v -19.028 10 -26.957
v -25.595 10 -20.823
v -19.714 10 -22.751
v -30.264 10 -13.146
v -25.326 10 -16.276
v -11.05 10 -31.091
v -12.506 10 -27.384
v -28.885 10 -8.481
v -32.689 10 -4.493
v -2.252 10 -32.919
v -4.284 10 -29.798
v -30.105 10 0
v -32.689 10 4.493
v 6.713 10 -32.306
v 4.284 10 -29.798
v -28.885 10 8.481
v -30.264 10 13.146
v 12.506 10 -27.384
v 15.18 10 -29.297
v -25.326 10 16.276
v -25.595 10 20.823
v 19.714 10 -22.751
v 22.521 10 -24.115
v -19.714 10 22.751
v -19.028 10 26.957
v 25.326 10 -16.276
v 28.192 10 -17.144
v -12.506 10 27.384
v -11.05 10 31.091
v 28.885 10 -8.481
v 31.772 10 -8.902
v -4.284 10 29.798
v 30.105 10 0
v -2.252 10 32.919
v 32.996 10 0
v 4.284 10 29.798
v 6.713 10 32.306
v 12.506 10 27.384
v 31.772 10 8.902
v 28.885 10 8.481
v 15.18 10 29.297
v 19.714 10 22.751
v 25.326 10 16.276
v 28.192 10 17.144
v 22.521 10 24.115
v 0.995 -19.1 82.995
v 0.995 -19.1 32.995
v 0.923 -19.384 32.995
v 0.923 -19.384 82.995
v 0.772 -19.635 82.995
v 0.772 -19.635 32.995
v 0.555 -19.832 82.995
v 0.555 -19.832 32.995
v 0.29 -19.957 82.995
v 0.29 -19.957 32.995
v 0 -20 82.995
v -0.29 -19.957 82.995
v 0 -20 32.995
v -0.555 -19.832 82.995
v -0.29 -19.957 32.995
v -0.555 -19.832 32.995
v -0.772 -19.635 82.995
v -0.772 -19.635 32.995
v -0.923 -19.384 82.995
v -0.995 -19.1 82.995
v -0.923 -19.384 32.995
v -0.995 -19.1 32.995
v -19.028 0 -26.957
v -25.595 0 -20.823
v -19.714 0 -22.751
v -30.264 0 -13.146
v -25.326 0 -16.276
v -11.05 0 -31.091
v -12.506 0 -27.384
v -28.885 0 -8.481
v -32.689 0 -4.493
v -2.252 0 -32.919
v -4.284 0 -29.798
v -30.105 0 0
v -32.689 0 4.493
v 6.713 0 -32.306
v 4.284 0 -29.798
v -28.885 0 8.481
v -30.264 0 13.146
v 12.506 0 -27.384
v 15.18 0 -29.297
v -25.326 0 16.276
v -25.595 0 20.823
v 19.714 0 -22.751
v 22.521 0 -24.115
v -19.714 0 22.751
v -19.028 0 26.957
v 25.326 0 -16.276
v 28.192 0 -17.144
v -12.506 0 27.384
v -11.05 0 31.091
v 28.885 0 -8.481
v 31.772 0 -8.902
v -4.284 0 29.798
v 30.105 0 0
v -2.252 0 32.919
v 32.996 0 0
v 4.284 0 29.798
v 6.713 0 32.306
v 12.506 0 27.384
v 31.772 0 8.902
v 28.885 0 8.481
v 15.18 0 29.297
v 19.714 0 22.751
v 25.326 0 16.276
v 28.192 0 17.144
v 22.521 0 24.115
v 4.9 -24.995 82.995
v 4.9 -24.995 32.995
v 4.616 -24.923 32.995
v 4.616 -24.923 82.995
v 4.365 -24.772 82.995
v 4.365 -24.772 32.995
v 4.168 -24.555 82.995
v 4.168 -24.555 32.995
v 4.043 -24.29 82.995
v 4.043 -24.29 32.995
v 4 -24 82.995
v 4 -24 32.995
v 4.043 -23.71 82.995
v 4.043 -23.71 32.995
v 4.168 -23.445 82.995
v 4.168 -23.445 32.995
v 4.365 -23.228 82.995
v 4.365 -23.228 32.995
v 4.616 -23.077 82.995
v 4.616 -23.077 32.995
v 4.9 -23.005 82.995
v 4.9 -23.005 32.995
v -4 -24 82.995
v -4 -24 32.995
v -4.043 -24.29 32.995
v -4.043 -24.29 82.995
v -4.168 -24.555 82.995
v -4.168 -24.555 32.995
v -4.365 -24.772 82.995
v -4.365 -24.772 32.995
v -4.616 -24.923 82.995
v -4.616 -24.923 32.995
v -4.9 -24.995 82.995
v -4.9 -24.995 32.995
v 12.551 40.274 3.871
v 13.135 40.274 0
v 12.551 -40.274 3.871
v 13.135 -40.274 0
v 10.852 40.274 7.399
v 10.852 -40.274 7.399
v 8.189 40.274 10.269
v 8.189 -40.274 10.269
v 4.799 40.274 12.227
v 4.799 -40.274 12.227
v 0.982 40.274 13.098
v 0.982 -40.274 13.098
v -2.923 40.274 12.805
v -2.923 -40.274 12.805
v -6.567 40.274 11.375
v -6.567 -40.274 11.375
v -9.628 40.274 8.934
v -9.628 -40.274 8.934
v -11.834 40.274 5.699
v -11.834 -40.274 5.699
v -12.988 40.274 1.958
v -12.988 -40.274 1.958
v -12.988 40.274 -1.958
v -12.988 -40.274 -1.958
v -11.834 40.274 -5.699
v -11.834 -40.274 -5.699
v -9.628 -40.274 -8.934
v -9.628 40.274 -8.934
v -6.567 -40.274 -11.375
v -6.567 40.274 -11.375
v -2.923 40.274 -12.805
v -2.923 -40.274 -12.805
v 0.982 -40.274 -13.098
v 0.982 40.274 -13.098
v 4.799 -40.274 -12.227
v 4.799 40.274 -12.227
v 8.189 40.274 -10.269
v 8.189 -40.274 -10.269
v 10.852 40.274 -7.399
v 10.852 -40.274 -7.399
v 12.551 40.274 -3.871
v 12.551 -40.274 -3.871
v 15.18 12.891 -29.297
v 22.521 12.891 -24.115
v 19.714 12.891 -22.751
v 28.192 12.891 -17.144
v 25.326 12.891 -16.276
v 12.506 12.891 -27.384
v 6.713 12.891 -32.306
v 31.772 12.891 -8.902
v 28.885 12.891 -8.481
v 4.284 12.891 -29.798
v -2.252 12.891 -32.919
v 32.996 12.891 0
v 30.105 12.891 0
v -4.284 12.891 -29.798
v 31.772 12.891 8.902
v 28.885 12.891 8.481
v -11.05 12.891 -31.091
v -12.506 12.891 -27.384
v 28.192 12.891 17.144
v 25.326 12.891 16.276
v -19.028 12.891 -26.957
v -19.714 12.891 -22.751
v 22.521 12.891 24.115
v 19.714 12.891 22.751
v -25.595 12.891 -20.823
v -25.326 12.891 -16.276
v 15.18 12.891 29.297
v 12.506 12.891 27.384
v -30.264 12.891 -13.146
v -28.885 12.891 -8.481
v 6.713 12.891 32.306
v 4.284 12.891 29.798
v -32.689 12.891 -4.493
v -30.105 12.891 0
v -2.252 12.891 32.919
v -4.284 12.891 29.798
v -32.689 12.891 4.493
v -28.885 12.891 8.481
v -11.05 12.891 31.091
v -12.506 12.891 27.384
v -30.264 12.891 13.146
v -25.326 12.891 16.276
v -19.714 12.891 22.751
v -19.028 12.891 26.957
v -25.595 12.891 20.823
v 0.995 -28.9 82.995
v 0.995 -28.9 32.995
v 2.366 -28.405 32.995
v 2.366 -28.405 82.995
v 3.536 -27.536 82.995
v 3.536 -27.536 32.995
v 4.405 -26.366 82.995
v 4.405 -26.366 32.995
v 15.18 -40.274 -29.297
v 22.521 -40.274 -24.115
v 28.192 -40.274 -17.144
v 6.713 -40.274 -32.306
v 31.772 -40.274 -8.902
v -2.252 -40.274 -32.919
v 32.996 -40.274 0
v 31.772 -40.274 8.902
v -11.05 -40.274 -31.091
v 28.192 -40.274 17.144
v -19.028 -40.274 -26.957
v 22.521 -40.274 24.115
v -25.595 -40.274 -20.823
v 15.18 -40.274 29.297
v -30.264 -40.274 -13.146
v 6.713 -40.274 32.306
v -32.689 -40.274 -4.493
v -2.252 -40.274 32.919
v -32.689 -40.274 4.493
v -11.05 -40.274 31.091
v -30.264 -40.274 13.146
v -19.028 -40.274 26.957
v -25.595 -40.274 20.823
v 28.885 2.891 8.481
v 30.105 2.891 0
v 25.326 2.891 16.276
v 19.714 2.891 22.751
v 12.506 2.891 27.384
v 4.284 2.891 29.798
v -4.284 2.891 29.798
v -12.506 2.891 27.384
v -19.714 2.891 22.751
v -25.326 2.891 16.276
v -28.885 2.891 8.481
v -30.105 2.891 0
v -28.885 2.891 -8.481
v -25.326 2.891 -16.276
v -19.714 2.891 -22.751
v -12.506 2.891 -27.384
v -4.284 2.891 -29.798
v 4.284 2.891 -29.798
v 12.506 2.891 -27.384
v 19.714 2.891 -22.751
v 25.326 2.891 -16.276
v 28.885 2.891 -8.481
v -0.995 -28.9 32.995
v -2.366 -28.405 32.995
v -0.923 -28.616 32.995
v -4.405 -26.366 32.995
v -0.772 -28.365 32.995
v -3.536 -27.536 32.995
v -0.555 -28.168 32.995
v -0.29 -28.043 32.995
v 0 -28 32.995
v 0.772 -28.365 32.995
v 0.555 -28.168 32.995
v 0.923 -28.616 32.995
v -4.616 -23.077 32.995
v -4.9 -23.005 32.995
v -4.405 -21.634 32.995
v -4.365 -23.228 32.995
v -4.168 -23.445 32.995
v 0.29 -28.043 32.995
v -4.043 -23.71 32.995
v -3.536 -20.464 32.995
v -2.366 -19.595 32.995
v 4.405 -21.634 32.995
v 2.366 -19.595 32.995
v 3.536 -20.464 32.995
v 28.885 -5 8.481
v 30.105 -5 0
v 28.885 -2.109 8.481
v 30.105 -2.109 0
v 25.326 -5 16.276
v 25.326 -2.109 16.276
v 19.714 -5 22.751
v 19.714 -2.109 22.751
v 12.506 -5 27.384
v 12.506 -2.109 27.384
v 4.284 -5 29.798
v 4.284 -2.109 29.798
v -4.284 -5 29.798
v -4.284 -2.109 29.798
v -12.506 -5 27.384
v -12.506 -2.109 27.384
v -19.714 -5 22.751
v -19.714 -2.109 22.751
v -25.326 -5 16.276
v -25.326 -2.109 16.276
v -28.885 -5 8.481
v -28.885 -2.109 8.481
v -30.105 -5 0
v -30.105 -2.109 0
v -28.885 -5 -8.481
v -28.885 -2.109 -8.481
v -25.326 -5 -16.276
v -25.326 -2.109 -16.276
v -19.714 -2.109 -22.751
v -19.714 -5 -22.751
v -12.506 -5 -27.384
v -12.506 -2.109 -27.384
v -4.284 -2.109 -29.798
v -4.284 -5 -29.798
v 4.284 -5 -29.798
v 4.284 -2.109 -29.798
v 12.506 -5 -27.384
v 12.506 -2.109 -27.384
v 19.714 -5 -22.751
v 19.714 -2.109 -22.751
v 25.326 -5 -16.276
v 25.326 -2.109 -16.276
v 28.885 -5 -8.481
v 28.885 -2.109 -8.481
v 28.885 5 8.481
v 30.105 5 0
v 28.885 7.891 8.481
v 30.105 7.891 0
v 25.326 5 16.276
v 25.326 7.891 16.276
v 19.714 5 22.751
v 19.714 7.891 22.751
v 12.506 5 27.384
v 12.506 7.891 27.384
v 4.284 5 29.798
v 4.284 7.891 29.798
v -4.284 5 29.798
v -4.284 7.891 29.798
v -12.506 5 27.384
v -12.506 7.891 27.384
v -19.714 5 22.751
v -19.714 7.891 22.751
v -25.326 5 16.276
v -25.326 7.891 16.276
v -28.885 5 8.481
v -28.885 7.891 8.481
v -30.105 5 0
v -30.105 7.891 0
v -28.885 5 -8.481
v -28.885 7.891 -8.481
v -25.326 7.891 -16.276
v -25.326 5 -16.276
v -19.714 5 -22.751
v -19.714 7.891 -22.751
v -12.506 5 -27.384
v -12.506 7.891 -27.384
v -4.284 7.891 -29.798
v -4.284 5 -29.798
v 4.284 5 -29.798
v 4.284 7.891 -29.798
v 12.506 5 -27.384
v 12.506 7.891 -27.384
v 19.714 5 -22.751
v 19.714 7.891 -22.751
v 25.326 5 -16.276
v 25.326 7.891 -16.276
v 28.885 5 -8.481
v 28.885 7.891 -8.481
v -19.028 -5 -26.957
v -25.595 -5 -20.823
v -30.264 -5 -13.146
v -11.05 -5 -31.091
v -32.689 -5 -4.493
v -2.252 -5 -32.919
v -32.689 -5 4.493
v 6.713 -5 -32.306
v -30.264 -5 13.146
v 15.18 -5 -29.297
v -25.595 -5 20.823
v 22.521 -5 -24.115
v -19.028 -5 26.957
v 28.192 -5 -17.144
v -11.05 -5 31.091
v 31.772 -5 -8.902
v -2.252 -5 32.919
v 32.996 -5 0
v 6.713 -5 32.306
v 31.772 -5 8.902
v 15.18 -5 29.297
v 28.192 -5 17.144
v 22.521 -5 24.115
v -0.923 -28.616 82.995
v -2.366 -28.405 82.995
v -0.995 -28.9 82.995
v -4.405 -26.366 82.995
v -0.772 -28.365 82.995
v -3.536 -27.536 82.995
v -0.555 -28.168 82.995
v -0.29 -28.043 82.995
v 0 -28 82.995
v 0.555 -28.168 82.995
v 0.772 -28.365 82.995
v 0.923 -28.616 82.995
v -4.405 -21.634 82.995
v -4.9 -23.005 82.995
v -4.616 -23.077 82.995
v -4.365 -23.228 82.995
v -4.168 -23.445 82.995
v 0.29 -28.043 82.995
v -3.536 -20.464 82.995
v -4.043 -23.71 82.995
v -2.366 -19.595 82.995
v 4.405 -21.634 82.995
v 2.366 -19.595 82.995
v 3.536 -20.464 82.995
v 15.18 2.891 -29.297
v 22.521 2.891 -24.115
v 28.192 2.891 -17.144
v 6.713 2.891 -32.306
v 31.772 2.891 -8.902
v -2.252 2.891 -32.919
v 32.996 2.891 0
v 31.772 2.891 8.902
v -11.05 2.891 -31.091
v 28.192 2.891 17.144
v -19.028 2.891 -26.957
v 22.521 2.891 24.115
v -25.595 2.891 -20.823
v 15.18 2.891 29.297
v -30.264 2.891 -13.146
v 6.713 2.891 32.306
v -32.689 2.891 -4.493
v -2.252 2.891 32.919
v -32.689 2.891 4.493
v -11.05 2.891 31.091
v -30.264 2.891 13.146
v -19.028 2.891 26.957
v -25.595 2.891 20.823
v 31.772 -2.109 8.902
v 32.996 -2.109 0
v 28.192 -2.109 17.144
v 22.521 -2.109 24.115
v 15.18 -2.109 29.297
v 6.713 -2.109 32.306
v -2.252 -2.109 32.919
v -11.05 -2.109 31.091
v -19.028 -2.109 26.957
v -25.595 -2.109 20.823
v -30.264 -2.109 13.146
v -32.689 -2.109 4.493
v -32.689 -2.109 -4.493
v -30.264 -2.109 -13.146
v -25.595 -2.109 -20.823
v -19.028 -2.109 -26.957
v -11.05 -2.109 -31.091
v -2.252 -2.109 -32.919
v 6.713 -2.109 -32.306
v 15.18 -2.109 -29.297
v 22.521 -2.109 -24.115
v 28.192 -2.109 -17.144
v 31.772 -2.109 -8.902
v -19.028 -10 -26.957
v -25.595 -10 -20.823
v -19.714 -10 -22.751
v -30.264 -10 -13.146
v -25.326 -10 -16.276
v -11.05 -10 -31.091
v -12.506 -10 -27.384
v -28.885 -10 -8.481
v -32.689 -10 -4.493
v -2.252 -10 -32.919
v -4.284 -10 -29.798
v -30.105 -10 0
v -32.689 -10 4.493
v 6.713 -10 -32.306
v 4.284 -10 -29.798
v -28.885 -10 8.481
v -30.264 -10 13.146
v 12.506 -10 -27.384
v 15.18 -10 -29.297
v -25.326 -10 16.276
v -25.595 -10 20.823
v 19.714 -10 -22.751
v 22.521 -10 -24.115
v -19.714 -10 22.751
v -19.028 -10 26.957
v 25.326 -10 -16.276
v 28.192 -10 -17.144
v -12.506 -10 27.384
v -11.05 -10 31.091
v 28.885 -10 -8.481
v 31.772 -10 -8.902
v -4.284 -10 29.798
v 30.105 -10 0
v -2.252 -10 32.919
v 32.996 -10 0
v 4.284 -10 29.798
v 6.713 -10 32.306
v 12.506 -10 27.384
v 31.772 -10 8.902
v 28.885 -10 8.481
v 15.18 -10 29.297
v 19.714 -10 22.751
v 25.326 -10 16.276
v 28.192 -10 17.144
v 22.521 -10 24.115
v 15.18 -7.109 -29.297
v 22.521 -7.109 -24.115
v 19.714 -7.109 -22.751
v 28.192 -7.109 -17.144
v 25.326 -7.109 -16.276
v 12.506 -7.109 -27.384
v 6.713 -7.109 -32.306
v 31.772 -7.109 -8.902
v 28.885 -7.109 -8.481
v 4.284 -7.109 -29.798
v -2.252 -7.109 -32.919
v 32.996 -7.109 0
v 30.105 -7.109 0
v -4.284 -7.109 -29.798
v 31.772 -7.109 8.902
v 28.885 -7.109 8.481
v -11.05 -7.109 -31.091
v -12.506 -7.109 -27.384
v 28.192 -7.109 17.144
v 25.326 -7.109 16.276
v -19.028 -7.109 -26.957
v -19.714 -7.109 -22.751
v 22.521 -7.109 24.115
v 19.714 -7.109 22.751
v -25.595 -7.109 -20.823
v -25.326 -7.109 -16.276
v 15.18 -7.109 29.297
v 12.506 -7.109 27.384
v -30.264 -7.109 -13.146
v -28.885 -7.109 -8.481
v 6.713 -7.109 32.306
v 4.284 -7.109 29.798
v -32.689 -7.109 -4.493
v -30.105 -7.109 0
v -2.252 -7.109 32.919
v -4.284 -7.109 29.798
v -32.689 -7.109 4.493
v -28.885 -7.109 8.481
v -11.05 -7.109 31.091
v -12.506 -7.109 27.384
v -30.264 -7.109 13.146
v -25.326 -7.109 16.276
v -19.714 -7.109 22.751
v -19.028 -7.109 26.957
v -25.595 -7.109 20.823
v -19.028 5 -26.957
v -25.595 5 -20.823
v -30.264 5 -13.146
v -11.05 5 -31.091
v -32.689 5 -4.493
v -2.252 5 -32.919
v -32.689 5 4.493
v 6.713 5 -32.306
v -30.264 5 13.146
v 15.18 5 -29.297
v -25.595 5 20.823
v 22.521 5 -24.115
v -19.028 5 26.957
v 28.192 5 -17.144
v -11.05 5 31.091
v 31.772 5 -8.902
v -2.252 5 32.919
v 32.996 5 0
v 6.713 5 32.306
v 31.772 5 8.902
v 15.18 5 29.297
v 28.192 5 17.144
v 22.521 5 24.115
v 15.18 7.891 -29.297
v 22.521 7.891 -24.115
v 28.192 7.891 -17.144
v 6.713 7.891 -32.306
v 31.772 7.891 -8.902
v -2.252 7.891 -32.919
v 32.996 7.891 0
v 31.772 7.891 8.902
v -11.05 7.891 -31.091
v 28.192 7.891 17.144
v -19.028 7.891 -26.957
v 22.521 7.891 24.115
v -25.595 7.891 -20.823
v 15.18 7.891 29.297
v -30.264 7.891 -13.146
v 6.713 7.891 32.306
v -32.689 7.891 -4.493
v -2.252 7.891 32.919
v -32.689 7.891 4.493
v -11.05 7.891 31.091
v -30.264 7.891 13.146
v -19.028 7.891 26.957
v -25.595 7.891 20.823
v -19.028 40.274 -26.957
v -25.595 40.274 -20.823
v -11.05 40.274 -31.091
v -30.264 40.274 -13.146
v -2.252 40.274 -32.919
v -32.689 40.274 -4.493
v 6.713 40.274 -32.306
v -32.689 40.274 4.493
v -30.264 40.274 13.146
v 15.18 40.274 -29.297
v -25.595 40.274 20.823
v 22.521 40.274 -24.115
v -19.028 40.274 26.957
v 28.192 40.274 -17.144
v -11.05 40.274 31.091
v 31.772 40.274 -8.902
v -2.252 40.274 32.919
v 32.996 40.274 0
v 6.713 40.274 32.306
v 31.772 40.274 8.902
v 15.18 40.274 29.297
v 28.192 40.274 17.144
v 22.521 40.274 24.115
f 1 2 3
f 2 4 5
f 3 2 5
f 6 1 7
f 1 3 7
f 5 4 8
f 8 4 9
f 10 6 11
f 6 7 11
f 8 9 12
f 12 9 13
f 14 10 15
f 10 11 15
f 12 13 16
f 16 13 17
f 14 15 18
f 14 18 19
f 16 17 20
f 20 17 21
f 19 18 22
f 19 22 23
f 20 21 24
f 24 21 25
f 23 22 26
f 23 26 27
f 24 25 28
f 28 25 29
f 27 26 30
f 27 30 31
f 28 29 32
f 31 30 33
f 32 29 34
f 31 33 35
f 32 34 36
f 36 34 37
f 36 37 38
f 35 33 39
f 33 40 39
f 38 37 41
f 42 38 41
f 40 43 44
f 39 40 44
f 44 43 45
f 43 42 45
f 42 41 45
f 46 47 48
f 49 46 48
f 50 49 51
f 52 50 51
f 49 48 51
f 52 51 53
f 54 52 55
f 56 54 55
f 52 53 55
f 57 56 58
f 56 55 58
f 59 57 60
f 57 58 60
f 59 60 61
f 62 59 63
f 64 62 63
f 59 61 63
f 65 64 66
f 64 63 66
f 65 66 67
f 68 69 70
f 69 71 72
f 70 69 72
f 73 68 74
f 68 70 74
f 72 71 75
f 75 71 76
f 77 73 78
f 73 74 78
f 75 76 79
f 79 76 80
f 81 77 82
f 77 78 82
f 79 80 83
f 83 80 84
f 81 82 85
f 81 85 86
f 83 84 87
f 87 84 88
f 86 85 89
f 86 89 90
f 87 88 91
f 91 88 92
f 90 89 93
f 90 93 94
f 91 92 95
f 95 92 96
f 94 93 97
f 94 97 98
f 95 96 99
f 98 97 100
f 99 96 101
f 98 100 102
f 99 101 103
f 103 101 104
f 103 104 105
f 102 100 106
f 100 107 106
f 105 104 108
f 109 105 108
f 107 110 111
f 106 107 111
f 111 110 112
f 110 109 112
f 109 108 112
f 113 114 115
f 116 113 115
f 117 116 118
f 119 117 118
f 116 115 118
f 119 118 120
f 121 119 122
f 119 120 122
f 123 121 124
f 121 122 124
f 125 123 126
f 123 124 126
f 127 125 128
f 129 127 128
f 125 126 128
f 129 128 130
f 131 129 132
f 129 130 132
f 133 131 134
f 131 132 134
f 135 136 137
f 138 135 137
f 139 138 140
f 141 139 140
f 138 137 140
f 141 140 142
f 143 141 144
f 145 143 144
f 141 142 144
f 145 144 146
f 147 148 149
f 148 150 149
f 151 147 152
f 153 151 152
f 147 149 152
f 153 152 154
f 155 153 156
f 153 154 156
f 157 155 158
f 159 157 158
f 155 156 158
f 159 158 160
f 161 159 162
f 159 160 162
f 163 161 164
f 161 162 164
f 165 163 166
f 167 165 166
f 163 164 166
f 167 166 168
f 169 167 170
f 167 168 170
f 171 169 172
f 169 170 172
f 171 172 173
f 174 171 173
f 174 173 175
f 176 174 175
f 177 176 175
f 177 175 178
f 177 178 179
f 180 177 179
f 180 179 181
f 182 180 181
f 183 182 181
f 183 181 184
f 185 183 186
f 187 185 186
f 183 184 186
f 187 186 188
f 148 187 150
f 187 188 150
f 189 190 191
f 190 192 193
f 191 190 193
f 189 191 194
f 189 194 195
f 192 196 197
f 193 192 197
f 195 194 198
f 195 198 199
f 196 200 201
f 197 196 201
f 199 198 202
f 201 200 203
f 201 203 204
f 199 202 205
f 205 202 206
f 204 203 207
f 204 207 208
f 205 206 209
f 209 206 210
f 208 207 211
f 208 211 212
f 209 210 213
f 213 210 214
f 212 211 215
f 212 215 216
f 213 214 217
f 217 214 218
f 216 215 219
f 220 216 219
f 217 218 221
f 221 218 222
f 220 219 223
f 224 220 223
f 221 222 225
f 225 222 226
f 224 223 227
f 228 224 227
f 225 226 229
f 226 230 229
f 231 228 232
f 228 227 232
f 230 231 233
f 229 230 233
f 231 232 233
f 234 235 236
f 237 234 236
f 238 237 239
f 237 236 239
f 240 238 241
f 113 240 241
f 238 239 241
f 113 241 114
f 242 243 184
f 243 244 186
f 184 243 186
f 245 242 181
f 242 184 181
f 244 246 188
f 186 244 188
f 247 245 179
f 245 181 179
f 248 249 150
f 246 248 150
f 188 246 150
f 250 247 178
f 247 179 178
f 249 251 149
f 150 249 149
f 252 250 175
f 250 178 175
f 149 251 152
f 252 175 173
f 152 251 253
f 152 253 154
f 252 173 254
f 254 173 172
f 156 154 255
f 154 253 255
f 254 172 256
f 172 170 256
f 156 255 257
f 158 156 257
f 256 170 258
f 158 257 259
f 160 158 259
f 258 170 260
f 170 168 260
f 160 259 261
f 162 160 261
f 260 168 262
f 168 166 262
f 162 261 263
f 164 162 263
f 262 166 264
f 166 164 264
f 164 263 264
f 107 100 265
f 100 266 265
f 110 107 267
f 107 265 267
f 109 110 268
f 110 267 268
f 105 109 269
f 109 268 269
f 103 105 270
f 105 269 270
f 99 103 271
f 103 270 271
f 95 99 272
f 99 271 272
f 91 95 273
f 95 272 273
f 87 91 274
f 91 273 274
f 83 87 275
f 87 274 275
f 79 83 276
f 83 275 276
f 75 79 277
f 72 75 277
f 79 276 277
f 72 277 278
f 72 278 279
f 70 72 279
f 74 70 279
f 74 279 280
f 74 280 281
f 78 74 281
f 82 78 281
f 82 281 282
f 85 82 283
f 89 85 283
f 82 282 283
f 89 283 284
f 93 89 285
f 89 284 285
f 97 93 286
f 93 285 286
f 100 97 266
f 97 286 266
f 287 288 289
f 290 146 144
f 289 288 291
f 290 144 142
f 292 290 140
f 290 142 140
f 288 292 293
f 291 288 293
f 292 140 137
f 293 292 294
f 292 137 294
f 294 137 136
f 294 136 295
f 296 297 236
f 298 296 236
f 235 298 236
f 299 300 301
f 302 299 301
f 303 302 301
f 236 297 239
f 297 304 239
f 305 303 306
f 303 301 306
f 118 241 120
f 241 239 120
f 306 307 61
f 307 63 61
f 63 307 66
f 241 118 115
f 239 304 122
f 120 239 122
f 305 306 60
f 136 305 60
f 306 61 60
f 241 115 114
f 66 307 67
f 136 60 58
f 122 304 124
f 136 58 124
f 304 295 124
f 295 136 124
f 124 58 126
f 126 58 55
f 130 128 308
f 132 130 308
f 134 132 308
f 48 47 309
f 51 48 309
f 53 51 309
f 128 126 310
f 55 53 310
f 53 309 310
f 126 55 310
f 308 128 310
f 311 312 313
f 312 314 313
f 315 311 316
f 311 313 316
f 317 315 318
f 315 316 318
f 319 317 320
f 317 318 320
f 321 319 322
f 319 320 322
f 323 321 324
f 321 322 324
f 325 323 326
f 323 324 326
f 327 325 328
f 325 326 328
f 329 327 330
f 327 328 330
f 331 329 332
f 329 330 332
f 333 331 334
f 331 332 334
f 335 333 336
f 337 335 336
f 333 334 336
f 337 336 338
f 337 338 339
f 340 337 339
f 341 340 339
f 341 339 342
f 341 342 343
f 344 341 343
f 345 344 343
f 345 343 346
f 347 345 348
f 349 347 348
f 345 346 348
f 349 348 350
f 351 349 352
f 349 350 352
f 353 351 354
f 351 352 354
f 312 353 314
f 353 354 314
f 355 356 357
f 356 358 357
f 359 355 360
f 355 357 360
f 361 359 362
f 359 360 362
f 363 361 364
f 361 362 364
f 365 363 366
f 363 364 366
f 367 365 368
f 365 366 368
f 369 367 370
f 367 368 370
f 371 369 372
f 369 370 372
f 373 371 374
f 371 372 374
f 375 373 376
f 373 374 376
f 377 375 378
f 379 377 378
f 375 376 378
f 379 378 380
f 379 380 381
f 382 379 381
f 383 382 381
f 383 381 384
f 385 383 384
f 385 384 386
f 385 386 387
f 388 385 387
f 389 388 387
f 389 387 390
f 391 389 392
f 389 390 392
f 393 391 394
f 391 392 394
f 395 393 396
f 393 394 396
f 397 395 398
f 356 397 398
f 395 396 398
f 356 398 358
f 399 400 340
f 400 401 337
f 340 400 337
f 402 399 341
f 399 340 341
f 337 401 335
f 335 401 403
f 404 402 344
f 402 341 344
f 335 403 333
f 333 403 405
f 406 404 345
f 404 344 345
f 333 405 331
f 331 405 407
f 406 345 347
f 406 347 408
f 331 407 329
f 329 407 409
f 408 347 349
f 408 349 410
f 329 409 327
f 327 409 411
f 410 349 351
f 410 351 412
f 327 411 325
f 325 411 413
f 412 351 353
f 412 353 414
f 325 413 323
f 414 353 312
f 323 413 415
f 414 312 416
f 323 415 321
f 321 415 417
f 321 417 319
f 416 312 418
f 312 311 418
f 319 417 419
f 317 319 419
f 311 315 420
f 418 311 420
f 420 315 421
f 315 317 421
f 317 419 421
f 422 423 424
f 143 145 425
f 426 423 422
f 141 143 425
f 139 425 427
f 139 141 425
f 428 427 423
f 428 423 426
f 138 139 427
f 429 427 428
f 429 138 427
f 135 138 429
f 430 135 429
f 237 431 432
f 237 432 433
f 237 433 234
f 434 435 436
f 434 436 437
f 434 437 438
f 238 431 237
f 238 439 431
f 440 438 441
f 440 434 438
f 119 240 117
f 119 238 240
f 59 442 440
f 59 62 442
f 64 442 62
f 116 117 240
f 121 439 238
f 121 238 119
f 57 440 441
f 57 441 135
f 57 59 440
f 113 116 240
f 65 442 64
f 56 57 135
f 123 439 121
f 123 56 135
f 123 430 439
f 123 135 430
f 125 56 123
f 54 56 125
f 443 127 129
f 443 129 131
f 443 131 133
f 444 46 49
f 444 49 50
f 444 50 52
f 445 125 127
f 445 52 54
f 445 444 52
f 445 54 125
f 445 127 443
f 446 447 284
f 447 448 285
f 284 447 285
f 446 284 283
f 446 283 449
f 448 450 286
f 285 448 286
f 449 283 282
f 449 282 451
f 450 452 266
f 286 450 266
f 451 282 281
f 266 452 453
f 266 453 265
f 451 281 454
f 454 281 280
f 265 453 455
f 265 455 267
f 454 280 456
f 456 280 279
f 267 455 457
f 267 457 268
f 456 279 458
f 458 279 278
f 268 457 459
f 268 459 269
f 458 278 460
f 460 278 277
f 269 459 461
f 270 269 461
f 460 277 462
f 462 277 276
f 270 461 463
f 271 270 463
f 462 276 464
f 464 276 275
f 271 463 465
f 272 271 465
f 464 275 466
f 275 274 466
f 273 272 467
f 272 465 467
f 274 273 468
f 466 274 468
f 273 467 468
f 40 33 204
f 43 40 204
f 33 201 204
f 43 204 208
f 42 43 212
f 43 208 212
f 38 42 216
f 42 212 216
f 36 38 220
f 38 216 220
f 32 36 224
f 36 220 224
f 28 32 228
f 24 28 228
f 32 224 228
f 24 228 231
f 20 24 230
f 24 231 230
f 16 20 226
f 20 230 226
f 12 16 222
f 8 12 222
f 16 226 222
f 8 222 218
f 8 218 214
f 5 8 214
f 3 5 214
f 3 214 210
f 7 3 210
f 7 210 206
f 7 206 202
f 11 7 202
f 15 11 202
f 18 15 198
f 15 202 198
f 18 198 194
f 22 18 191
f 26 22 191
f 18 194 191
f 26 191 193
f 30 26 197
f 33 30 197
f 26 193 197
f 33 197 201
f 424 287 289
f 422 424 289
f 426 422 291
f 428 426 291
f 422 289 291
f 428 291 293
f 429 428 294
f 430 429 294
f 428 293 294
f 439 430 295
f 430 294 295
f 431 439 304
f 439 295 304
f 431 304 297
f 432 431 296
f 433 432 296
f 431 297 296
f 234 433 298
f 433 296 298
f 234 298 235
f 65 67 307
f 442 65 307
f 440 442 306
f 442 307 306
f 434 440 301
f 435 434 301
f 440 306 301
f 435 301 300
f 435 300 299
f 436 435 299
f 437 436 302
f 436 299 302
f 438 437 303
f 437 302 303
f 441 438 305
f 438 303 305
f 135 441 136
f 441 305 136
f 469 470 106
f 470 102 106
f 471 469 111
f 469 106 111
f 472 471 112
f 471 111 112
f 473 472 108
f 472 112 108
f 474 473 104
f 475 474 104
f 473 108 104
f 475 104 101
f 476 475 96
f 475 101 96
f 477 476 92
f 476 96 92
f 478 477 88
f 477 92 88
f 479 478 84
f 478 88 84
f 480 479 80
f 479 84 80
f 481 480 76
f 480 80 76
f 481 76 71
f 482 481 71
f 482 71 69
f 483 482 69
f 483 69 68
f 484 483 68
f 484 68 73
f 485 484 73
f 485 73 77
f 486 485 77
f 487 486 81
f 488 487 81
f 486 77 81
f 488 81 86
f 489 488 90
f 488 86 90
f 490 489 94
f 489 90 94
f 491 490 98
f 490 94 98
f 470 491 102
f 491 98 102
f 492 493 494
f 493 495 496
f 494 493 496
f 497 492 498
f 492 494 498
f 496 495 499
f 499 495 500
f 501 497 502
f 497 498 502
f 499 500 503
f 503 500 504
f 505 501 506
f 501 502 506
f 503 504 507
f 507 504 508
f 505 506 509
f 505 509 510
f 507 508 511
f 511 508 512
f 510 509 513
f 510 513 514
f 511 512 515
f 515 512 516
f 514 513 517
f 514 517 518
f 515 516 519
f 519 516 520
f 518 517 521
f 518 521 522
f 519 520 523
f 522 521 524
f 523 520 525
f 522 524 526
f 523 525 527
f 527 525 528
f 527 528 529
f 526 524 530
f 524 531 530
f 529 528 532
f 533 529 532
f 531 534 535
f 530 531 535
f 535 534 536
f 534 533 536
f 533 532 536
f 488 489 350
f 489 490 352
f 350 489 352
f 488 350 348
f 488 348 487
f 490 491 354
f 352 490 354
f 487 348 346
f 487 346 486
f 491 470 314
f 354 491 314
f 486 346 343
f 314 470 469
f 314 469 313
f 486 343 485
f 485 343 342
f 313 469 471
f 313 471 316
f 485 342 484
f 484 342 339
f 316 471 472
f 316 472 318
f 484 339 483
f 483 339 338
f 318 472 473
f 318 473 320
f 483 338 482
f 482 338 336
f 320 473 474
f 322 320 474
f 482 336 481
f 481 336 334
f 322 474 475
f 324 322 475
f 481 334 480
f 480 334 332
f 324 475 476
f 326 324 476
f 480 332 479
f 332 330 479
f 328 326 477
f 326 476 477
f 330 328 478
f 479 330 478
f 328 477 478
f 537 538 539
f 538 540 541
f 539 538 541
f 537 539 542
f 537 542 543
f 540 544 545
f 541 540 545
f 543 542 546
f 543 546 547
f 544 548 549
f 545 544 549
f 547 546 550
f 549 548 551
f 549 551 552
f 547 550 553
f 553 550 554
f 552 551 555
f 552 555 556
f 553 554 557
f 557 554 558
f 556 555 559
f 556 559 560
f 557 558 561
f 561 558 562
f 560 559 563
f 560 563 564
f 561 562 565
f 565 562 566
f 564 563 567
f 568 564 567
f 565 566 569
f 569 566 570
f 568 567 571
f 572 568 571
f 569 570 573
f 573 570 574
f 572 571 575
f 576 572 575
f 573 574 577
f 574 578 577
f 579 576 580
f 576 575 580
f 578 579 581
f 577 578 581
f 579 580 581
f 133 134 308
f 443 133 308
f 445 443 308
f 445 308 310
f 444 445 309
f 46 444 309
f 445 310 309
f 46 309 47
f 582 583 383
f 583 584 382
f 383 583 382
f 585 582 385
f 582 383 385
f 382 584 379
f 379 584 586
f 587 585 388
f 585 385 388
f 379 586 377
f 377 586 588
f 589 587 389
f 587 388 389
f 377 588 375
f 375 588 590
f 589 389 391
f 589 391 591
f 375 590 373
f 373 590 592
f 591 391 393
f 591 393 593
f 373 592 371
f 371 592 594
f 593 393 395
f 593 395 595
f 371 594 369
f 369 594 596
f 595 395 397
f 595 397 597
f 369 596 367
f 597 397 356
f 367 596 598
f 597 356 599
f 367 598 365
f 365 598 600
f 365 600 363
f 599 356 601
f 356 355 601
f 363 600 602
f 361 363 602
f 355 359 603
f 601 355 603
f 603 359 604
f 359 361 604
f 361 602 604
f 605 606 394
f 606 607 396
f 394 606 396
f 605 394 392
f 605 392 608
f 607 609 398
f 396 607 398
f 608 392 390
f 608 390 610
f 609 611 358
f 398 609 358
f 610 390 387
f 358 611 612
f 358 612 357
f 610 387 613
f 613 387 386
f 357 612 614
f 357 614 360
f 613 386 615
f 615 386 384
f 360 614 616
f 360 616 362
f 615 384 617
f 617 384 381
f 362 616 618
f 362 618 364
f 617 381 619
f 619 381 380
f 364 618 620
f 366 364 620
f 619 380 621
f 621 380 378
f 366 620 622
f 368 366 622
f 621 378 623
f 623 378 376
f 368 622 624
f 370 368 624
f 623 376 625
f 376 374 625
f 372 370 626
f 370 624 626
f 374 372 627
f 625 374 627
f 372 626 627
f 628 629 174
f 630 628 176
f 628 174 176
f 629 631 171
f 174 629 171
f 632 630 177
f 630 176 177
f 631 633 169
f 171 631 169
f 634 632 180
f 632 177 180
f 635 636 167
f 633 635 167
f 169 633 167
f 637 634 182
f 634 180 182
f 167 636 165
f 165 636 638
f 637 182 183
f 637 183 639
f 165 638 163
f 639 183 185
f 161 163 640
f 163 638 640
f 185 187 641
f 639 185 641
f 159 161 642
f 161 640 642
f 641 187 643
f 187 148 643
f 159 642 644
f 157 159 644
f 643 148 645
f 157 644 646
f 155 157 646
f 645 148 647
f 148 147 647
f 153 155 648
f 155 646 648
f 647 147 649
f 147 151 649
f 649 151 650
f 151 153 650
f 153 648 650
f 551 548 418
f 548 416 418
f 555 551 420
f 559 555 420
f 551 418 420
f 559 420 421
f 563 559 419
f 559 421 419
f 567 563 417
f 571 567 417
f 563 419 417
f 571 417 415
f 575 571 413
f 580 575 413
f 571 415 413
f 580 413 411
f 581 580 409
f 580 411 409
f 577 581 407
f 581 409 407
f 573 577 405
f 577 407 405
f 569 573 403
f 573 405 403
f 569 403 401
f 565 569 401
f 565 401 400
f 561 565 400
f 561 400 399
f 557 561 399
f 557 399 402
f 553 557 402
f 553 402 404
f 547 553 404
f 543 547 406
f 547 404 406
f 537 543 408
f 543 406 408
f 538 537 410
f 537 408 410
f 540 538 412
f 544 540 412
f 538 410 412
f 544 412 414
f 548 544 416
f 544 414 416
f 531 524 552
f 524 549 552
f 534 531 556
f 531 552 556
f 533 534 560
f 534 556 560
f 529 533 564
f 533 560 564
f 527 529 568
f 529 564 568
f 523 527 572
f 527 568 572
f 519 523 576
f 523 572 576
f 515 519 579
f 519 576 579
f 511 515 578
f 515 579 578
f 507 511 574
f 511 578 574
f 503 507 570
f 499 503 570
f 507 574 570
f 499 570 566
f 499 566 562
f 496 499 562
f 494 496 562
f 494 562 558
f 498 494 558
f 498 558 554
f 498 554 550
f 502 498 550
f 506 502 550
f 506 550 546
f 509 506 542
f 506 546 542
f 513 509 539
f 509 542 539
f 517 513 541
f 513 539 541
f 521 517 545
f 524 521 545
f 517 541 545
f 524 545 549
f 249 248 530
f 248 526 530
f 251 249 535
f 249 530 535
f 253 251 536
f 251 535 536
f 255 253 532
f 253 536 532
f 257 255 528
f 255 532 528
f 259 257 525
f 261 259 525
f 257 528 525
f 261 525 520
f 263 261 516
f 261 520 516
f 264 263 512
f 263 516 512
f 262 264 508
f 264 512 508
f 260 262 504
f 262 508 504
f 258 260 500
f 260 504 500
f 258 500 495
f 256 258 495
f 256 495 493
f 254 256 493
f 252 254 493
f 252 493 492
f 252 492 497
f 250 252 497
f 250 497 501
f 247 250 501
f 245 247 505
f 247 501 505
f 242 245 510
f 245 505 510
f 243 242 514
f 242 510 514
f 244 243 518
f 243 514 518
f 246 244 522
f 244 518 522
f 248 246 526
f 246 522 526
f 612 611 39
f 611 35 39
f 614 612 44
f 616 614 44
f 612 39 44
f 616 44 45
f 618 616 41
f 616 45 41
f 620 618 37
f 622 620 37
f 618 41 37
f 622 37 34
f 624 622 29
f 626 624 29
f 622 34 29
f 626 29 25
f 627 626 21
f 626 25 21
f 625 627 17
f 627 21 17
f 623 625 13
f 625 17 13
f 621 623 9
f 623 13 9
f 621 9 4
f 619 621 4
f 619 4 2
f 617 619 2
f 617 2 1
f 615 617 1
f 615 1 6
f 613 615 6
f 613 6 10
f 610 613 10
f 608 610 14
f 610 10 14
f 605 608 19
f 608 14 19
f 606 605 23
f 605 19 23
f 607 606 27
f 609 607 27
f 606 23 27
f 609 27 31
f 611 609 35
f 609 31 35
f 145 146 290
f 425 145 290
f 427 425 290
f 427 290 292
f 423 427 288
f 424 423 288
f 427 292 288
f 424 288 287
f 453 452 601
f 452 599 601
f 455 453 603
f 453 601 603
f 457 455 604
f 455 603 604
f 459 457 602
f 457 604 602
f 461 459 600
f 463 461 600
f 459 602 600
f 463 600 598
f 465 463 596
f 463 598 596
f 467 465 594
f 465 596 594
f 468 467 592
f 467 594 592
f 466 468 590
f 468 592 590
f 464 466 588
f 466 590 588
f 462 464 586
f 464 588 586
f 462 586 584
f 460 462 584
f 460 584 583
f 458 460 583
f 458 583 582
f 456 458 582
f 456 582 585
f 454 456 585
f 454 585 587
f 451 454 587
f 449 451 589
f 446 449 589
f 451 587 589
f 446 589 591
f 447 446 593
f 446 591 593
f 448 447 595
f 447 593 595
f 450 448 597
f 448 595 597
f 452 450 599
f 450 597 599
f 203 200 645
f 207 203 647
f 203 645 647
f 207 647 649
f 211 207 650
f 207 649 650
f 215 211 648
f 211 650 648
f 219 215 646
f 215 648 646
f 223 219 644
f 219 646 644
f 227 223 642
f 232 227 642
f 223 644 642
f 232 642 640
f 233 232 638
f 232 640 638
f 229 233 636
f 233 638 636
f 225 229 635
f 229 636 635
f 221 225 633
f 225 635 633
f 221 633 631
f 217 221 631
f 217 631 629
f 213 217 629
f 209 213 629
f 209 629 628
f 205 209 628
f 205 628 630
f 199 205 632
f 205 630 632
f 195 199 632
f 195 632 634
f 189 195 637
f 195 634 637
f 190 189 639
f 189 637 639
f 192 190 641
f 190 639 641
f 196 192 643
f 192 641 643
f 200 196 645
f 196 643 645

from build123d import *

# Parameters (mm, degrees)
F4_DEPTH = 50


with BuildPart() as f1:
    # F0 (on Top) → F1 (revolve)
    with BuildSketch(Plane.XY):
        Polygon((32.9958705818, 40.2742755358), (13.1345845242, 40.2742755358), (13.1345845242, -40.2742755358), (32.9958705818, -40.2742755358), (32.9958705818, -10), (30.1045414905, -10), (30.1045414905, -7.1086709088), (32.9958705818, -7.1086709088), (32.9958705818, -5), (30.1045414905, -5), (30.1045414905, -2.1086709088), (32.9958705818, -2.1086709088), (32.9958705818, 0), (30.1045414905, 0), (30.1045414905, 2.8913290912), (32.9958705818, 2.8913290912), (32.9958705818, 5), (30.1045414905, 5), (30.1045414905, 7.8913290912), (32.9958705818, 7.8913290912), (32.9958705818, 10), (30.1045414905, 10), (30.1045414905, 12.8913290912), (32.9958705818, 12.8913290912), align=None)
    revolve(axis=Axis((0, -1.4844276011, 0), (0, -1, 0)))


with BuildPart() as f4:
    # F3 (on offset) → F4 (new body)
    with BuildSketch(Plane.XY.offset(32.995)):
        with BuildLine():
            ThreePointArc((4.9, -24.9949874371), (4, -24), (4.9, -23.0050125629))
            ThreePointArc((4.9, -23.0050125629), (3.5355339059, -20.4644660941), (0.9949874371, -19.1))
            ThreePointArc((0.9949874371, -19.1), (0, -20), (-0.9949874371, -19.1))
            ThreePointArc((-0.9949874371, -19.1), (-3.5355339059, -20.4644660941), (-4.9, -23.0050125629))
            ThreePointArc((-4.9, -23.0050125629), (-4.2583801513, -23.3291796068), (-4, -24))
            ThreePointArc((-4, -24), (-4.2583801513, -24.6708203932), (-4.9, -24.9949874371))
            ThreePointArc((-4.9, -24.9949874371), (-3.5355339059, -27.5355339059), (-0.9949874371, -28.9))
            ThreePointArc((-0.9949874371, -28.9), (0, -28), (0.9949874371, -28.9))
            ThreePointArc((0.9949874371, -28.9), (3.5355339059, -27.5355339059), (4.9, -24.9949874371))
        make_face()
    extrude(amount=F4_DEPTH)


solid = Compound([f1.part, f4.part])
